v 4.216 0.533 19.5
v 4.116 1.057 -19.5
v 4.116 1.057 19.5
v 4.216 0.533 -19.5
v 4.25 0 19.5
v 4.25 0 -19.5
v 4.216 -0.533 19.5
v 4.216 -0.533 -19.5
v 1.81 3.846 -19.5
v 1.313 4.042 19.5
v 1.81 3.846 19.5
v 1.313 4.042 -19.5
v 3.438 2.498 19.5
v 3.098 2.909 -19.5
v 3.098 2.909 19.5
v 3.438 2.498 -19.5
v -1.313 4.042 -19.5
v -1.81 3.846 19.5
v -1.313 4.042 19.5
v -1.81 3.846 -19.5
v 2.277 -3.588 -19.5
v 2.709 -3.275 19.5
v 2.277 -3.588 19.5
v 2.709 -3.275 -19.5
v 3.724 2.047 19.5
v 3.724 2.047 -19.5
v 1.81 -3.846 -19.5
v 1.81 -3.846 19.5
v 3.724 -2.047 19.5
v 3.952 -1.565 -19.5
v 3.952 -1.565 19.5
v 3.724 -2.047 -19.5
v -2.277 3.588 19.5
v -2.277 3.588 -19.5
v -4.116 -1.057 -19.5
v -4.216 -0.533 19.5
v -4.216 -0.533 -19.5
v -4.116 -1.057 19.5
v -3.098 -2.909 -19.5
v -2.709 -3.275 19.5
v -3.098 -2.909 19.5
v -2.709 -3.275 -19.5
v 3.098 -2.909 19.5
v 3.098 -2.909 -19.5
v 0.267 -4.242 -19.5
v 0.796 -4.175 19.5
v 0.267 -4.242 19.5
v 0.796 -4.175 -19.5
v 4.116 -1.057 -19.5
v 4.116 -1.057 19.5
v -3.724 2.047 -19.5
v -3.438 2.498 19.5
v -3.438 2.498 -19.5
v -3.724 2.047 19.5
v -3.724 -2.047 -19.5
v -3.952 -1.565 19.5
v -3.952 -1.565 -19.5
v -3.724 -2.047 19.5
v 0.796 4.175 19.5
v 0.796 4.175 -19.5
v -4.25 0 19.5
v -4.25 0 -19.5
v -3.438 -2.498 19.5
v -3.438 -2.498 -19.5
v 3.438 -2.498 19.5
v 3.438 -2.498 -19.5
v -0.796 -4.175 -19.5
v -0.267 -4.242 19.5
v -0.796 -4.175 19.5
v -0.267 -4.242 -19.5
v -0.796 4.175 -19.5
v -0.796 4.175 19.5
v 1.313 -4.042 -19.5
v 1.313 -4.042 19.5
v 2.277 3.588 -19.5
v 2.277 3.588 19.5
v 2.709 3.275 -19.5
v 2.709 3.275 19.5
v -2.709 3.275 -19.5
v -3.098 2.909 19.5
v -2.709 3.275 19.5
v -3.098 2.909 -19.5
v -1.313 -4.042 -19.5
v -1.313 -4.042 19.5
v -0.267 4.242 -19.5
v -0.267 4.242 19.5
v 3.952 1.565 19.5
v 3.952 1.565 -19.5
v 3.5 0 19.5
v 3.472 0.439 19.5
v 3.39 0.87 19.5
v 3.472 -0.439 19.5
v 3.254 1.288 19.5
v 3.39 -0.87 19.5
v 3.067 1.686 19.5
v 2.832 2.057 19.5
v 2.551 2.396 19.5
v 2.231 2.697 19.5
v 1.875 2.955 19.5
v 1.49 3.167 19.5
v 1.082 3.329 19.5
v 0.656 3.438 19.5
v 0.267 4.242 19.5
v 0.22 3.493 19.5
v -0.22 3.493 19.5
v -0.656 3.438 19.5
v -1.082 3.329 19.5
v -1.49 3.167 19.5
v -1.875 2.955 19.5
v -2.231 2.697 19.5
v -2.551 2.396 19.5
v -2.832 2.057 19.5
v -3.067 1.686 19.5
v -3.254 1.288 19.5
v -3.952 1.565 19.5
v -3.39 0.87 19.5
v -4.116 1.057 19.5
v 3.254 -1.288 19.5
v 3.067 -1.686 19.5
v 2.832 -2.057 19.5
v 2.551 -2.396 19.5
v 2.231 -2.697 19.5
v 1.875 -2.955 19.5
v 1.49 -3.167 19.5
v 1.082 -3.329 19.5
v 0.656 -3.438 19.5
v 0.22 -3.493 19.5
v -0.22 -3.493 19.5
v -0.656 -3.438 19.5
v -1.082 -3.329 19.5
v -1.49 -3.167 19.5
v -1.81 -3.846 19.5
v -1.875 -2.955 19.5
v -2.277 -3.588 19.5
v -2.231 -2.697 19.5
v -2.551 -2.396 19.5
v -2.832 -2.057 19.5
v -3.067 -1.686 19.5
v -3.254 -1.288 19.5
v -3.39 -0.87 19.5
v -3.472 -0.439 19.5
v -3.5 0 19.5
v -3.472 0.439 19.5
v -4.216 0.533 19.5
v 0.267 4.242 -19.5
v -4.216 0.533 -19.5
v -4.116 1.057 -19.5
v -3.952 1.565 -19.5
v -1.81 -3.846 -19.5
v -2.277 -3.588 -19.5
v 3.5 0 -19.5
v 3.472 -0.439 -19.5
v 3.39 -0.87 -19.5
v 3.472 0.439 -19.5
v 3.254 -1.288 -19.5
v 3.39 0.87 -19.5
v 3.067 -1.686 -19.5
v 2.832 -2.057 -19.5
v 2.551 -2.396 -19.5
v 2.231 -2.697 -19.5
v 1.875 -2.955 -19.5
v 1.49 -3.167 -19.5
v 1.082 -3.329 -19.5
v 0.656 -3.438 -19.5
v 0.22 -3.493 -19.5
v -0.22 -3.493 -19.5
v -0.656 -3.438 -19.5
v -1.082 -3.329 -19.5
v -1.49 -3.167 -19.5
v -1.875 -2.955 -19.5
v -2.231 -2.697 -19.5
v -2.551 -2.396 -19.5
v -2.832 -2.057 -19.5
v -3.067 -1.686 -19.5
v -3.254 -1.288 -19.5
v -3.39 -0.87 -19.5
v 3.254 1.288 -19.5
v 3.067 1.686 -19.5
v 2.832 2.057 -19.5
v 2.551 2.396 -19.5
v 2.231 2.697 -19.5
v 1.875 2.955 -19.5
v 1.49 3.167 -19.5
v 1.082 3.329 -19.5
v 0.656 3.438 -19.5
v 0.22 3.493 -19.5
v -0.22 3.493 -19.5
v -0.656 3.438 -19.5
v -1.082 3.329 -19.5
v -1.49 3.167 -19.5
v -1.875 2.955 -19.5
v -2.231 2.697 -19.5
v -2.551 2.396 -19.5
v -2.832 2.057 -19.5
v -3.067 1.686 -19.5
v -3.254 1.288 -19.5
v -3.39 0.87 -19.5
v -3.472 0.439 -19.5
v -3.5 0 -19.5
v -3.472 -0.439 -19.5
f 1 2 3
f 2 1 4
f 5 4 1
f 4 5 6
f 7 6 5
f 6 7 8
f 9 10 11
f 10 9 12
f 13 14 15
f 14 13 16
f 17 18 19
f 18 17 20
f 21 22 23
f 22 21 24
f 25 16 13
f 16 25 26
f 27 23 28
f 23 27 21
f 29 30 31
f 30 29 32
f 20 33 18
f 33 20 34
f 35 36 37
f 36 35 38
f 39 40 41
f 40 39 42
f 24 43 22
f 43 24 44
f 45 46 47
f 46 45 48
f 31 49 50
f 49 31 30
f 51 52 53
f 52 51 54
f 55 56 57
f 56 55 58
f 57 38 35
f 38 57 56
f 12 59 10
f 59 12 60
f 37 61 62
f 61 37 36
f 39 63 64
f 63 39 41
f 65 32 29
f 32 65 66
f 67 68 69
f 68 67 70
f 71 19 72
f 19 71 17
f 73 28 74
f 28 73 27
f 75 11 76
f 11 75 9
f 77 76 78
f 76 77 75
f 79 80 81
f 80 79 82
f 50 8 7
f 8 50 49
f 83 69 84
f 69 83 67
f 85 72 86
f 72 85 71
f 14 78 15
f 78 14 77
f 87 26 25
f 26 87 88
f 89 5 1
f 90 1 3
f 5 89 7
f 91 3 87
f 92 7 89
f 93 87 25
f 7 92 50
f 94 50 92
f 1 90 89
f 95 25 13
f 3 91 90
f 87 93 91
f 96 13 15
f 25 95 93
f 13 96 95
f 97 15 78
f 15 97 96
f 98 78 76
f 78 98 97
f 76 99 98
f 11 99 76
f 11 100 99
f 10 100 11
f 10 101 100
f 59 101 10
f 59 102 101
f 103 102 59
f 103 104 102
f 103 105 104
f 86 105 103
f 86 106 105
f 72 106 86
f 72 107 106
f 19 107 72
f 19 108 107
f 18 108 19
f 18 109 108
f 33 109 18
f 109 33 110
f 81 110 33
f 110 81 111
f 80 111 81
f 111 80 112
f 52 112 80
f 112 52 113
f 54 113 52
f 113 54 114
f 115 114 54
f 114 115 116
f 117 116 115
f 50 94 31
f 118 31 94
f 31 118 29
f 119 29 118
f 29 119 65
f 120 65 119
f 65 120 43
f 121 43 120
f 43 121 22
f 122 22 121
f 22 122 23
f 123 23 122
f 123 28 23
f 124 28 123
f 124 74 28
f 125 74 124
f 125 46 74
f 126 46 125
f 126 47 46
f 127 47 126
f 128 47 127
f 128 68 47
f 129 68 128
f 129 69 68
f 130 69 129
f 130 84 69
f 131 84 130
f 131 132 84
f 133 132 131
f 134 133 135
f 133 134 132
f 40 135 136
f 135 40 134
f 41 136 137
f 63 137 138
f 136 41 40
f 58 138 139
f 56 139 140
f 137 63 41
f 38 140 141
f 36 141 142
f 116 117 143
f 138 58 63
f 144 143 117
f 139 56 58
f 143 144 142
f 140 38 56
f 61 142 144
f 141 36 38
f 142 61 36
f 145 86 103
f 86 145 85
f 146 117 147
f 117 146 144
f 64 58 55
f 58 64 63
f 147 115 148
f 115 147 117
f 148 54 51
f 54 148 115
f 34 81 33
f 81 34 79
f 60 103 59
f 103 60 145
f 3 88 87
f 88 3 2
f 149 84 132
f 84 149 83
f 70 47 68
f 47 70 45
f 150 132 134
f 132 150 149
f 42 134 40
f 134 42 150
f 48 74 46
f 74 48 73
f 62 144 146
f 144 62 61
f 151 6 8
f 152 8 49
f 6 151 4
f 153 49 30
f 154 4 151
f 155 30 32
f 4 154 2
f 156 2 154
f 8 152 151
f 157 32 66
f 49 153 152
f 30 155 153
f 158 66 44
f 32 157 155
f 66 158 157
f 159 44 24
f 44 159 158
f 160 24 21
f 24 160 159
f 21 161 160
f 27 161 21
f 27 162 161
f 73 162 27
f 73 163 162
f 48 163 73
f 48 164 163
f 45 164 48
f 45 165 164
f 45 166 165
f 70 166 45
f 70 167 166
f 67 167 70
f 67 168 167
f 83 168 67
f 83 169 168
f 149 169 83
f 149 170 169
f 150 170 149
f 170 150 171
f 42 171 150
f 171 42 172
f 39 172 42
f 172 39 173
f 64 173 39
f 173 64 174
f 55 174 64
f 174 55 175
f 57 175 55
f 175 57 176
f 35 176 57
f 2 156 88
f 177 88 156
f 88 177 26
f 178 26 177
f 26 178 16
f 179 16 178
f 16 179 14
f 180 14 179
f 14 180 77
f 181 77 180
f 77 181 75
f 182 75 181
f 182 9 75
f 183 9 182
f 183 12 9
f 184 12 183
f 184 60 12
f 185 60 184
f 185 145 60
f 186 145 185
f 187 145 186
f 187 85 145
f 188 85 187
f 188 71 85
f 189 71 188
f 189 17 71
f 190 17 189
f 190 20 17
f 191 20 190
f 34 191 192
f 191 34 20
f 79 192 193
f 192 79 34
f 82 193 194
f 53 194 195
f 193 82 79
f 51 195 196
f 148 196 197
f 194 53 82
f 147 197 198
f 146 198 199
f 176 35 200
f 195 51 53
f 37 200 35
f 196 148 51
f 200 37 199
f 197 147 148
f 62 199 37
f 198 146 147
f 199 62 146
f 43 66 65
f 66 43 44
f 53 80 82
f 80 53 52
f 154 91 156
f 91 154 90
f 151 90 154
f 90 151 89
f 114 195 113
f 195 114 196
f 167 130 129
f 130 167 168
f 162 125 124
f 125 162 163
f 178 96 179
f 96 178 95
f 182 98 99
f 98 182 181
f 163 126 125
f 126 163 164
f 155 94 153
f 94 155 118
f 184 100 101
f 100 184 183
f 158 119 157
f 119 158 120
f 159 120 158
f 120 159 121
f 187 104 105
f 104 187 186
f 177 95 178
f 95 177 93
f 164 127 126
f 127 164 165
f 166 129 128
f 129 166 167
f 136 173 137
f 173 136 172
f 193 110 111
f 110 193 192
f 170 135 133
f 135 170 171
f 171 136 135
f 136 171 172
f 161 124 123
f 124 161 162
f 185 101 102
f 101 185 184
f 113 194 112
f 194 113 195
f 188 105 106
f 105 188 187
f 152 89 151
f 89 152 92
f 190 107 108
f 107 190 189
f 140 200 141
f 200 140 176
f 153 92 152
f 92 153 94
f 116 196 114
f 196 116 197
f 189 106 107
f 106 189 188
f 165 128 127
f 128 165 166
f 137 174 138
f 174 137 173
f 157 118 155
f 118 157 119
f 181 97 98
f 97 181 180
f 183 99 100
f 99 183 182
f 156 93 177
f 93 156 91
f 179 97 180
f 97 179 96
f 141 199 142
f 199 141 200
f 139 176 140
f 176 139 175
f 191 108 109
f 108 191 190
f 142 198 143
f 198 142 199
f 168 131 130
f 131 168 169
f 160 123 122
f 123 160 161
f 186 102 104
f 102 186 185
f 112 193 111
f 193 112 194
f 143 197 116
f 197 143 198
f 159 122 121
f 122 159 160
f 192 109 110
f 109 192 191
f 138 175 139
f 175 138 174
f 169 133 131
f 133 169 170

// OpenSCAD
$fn = 50;


difference() {
	union() {
		translate(v = [0, 0, -19.5000000000]) {
			cylinder(h = 39, r = 4.2500000000);
		}
	}
	union() {
		translate(v = [0, 0, -100.0000000000]) {
			cylinder(h = 200, r = 3.5000000000);
		}
	}
}
